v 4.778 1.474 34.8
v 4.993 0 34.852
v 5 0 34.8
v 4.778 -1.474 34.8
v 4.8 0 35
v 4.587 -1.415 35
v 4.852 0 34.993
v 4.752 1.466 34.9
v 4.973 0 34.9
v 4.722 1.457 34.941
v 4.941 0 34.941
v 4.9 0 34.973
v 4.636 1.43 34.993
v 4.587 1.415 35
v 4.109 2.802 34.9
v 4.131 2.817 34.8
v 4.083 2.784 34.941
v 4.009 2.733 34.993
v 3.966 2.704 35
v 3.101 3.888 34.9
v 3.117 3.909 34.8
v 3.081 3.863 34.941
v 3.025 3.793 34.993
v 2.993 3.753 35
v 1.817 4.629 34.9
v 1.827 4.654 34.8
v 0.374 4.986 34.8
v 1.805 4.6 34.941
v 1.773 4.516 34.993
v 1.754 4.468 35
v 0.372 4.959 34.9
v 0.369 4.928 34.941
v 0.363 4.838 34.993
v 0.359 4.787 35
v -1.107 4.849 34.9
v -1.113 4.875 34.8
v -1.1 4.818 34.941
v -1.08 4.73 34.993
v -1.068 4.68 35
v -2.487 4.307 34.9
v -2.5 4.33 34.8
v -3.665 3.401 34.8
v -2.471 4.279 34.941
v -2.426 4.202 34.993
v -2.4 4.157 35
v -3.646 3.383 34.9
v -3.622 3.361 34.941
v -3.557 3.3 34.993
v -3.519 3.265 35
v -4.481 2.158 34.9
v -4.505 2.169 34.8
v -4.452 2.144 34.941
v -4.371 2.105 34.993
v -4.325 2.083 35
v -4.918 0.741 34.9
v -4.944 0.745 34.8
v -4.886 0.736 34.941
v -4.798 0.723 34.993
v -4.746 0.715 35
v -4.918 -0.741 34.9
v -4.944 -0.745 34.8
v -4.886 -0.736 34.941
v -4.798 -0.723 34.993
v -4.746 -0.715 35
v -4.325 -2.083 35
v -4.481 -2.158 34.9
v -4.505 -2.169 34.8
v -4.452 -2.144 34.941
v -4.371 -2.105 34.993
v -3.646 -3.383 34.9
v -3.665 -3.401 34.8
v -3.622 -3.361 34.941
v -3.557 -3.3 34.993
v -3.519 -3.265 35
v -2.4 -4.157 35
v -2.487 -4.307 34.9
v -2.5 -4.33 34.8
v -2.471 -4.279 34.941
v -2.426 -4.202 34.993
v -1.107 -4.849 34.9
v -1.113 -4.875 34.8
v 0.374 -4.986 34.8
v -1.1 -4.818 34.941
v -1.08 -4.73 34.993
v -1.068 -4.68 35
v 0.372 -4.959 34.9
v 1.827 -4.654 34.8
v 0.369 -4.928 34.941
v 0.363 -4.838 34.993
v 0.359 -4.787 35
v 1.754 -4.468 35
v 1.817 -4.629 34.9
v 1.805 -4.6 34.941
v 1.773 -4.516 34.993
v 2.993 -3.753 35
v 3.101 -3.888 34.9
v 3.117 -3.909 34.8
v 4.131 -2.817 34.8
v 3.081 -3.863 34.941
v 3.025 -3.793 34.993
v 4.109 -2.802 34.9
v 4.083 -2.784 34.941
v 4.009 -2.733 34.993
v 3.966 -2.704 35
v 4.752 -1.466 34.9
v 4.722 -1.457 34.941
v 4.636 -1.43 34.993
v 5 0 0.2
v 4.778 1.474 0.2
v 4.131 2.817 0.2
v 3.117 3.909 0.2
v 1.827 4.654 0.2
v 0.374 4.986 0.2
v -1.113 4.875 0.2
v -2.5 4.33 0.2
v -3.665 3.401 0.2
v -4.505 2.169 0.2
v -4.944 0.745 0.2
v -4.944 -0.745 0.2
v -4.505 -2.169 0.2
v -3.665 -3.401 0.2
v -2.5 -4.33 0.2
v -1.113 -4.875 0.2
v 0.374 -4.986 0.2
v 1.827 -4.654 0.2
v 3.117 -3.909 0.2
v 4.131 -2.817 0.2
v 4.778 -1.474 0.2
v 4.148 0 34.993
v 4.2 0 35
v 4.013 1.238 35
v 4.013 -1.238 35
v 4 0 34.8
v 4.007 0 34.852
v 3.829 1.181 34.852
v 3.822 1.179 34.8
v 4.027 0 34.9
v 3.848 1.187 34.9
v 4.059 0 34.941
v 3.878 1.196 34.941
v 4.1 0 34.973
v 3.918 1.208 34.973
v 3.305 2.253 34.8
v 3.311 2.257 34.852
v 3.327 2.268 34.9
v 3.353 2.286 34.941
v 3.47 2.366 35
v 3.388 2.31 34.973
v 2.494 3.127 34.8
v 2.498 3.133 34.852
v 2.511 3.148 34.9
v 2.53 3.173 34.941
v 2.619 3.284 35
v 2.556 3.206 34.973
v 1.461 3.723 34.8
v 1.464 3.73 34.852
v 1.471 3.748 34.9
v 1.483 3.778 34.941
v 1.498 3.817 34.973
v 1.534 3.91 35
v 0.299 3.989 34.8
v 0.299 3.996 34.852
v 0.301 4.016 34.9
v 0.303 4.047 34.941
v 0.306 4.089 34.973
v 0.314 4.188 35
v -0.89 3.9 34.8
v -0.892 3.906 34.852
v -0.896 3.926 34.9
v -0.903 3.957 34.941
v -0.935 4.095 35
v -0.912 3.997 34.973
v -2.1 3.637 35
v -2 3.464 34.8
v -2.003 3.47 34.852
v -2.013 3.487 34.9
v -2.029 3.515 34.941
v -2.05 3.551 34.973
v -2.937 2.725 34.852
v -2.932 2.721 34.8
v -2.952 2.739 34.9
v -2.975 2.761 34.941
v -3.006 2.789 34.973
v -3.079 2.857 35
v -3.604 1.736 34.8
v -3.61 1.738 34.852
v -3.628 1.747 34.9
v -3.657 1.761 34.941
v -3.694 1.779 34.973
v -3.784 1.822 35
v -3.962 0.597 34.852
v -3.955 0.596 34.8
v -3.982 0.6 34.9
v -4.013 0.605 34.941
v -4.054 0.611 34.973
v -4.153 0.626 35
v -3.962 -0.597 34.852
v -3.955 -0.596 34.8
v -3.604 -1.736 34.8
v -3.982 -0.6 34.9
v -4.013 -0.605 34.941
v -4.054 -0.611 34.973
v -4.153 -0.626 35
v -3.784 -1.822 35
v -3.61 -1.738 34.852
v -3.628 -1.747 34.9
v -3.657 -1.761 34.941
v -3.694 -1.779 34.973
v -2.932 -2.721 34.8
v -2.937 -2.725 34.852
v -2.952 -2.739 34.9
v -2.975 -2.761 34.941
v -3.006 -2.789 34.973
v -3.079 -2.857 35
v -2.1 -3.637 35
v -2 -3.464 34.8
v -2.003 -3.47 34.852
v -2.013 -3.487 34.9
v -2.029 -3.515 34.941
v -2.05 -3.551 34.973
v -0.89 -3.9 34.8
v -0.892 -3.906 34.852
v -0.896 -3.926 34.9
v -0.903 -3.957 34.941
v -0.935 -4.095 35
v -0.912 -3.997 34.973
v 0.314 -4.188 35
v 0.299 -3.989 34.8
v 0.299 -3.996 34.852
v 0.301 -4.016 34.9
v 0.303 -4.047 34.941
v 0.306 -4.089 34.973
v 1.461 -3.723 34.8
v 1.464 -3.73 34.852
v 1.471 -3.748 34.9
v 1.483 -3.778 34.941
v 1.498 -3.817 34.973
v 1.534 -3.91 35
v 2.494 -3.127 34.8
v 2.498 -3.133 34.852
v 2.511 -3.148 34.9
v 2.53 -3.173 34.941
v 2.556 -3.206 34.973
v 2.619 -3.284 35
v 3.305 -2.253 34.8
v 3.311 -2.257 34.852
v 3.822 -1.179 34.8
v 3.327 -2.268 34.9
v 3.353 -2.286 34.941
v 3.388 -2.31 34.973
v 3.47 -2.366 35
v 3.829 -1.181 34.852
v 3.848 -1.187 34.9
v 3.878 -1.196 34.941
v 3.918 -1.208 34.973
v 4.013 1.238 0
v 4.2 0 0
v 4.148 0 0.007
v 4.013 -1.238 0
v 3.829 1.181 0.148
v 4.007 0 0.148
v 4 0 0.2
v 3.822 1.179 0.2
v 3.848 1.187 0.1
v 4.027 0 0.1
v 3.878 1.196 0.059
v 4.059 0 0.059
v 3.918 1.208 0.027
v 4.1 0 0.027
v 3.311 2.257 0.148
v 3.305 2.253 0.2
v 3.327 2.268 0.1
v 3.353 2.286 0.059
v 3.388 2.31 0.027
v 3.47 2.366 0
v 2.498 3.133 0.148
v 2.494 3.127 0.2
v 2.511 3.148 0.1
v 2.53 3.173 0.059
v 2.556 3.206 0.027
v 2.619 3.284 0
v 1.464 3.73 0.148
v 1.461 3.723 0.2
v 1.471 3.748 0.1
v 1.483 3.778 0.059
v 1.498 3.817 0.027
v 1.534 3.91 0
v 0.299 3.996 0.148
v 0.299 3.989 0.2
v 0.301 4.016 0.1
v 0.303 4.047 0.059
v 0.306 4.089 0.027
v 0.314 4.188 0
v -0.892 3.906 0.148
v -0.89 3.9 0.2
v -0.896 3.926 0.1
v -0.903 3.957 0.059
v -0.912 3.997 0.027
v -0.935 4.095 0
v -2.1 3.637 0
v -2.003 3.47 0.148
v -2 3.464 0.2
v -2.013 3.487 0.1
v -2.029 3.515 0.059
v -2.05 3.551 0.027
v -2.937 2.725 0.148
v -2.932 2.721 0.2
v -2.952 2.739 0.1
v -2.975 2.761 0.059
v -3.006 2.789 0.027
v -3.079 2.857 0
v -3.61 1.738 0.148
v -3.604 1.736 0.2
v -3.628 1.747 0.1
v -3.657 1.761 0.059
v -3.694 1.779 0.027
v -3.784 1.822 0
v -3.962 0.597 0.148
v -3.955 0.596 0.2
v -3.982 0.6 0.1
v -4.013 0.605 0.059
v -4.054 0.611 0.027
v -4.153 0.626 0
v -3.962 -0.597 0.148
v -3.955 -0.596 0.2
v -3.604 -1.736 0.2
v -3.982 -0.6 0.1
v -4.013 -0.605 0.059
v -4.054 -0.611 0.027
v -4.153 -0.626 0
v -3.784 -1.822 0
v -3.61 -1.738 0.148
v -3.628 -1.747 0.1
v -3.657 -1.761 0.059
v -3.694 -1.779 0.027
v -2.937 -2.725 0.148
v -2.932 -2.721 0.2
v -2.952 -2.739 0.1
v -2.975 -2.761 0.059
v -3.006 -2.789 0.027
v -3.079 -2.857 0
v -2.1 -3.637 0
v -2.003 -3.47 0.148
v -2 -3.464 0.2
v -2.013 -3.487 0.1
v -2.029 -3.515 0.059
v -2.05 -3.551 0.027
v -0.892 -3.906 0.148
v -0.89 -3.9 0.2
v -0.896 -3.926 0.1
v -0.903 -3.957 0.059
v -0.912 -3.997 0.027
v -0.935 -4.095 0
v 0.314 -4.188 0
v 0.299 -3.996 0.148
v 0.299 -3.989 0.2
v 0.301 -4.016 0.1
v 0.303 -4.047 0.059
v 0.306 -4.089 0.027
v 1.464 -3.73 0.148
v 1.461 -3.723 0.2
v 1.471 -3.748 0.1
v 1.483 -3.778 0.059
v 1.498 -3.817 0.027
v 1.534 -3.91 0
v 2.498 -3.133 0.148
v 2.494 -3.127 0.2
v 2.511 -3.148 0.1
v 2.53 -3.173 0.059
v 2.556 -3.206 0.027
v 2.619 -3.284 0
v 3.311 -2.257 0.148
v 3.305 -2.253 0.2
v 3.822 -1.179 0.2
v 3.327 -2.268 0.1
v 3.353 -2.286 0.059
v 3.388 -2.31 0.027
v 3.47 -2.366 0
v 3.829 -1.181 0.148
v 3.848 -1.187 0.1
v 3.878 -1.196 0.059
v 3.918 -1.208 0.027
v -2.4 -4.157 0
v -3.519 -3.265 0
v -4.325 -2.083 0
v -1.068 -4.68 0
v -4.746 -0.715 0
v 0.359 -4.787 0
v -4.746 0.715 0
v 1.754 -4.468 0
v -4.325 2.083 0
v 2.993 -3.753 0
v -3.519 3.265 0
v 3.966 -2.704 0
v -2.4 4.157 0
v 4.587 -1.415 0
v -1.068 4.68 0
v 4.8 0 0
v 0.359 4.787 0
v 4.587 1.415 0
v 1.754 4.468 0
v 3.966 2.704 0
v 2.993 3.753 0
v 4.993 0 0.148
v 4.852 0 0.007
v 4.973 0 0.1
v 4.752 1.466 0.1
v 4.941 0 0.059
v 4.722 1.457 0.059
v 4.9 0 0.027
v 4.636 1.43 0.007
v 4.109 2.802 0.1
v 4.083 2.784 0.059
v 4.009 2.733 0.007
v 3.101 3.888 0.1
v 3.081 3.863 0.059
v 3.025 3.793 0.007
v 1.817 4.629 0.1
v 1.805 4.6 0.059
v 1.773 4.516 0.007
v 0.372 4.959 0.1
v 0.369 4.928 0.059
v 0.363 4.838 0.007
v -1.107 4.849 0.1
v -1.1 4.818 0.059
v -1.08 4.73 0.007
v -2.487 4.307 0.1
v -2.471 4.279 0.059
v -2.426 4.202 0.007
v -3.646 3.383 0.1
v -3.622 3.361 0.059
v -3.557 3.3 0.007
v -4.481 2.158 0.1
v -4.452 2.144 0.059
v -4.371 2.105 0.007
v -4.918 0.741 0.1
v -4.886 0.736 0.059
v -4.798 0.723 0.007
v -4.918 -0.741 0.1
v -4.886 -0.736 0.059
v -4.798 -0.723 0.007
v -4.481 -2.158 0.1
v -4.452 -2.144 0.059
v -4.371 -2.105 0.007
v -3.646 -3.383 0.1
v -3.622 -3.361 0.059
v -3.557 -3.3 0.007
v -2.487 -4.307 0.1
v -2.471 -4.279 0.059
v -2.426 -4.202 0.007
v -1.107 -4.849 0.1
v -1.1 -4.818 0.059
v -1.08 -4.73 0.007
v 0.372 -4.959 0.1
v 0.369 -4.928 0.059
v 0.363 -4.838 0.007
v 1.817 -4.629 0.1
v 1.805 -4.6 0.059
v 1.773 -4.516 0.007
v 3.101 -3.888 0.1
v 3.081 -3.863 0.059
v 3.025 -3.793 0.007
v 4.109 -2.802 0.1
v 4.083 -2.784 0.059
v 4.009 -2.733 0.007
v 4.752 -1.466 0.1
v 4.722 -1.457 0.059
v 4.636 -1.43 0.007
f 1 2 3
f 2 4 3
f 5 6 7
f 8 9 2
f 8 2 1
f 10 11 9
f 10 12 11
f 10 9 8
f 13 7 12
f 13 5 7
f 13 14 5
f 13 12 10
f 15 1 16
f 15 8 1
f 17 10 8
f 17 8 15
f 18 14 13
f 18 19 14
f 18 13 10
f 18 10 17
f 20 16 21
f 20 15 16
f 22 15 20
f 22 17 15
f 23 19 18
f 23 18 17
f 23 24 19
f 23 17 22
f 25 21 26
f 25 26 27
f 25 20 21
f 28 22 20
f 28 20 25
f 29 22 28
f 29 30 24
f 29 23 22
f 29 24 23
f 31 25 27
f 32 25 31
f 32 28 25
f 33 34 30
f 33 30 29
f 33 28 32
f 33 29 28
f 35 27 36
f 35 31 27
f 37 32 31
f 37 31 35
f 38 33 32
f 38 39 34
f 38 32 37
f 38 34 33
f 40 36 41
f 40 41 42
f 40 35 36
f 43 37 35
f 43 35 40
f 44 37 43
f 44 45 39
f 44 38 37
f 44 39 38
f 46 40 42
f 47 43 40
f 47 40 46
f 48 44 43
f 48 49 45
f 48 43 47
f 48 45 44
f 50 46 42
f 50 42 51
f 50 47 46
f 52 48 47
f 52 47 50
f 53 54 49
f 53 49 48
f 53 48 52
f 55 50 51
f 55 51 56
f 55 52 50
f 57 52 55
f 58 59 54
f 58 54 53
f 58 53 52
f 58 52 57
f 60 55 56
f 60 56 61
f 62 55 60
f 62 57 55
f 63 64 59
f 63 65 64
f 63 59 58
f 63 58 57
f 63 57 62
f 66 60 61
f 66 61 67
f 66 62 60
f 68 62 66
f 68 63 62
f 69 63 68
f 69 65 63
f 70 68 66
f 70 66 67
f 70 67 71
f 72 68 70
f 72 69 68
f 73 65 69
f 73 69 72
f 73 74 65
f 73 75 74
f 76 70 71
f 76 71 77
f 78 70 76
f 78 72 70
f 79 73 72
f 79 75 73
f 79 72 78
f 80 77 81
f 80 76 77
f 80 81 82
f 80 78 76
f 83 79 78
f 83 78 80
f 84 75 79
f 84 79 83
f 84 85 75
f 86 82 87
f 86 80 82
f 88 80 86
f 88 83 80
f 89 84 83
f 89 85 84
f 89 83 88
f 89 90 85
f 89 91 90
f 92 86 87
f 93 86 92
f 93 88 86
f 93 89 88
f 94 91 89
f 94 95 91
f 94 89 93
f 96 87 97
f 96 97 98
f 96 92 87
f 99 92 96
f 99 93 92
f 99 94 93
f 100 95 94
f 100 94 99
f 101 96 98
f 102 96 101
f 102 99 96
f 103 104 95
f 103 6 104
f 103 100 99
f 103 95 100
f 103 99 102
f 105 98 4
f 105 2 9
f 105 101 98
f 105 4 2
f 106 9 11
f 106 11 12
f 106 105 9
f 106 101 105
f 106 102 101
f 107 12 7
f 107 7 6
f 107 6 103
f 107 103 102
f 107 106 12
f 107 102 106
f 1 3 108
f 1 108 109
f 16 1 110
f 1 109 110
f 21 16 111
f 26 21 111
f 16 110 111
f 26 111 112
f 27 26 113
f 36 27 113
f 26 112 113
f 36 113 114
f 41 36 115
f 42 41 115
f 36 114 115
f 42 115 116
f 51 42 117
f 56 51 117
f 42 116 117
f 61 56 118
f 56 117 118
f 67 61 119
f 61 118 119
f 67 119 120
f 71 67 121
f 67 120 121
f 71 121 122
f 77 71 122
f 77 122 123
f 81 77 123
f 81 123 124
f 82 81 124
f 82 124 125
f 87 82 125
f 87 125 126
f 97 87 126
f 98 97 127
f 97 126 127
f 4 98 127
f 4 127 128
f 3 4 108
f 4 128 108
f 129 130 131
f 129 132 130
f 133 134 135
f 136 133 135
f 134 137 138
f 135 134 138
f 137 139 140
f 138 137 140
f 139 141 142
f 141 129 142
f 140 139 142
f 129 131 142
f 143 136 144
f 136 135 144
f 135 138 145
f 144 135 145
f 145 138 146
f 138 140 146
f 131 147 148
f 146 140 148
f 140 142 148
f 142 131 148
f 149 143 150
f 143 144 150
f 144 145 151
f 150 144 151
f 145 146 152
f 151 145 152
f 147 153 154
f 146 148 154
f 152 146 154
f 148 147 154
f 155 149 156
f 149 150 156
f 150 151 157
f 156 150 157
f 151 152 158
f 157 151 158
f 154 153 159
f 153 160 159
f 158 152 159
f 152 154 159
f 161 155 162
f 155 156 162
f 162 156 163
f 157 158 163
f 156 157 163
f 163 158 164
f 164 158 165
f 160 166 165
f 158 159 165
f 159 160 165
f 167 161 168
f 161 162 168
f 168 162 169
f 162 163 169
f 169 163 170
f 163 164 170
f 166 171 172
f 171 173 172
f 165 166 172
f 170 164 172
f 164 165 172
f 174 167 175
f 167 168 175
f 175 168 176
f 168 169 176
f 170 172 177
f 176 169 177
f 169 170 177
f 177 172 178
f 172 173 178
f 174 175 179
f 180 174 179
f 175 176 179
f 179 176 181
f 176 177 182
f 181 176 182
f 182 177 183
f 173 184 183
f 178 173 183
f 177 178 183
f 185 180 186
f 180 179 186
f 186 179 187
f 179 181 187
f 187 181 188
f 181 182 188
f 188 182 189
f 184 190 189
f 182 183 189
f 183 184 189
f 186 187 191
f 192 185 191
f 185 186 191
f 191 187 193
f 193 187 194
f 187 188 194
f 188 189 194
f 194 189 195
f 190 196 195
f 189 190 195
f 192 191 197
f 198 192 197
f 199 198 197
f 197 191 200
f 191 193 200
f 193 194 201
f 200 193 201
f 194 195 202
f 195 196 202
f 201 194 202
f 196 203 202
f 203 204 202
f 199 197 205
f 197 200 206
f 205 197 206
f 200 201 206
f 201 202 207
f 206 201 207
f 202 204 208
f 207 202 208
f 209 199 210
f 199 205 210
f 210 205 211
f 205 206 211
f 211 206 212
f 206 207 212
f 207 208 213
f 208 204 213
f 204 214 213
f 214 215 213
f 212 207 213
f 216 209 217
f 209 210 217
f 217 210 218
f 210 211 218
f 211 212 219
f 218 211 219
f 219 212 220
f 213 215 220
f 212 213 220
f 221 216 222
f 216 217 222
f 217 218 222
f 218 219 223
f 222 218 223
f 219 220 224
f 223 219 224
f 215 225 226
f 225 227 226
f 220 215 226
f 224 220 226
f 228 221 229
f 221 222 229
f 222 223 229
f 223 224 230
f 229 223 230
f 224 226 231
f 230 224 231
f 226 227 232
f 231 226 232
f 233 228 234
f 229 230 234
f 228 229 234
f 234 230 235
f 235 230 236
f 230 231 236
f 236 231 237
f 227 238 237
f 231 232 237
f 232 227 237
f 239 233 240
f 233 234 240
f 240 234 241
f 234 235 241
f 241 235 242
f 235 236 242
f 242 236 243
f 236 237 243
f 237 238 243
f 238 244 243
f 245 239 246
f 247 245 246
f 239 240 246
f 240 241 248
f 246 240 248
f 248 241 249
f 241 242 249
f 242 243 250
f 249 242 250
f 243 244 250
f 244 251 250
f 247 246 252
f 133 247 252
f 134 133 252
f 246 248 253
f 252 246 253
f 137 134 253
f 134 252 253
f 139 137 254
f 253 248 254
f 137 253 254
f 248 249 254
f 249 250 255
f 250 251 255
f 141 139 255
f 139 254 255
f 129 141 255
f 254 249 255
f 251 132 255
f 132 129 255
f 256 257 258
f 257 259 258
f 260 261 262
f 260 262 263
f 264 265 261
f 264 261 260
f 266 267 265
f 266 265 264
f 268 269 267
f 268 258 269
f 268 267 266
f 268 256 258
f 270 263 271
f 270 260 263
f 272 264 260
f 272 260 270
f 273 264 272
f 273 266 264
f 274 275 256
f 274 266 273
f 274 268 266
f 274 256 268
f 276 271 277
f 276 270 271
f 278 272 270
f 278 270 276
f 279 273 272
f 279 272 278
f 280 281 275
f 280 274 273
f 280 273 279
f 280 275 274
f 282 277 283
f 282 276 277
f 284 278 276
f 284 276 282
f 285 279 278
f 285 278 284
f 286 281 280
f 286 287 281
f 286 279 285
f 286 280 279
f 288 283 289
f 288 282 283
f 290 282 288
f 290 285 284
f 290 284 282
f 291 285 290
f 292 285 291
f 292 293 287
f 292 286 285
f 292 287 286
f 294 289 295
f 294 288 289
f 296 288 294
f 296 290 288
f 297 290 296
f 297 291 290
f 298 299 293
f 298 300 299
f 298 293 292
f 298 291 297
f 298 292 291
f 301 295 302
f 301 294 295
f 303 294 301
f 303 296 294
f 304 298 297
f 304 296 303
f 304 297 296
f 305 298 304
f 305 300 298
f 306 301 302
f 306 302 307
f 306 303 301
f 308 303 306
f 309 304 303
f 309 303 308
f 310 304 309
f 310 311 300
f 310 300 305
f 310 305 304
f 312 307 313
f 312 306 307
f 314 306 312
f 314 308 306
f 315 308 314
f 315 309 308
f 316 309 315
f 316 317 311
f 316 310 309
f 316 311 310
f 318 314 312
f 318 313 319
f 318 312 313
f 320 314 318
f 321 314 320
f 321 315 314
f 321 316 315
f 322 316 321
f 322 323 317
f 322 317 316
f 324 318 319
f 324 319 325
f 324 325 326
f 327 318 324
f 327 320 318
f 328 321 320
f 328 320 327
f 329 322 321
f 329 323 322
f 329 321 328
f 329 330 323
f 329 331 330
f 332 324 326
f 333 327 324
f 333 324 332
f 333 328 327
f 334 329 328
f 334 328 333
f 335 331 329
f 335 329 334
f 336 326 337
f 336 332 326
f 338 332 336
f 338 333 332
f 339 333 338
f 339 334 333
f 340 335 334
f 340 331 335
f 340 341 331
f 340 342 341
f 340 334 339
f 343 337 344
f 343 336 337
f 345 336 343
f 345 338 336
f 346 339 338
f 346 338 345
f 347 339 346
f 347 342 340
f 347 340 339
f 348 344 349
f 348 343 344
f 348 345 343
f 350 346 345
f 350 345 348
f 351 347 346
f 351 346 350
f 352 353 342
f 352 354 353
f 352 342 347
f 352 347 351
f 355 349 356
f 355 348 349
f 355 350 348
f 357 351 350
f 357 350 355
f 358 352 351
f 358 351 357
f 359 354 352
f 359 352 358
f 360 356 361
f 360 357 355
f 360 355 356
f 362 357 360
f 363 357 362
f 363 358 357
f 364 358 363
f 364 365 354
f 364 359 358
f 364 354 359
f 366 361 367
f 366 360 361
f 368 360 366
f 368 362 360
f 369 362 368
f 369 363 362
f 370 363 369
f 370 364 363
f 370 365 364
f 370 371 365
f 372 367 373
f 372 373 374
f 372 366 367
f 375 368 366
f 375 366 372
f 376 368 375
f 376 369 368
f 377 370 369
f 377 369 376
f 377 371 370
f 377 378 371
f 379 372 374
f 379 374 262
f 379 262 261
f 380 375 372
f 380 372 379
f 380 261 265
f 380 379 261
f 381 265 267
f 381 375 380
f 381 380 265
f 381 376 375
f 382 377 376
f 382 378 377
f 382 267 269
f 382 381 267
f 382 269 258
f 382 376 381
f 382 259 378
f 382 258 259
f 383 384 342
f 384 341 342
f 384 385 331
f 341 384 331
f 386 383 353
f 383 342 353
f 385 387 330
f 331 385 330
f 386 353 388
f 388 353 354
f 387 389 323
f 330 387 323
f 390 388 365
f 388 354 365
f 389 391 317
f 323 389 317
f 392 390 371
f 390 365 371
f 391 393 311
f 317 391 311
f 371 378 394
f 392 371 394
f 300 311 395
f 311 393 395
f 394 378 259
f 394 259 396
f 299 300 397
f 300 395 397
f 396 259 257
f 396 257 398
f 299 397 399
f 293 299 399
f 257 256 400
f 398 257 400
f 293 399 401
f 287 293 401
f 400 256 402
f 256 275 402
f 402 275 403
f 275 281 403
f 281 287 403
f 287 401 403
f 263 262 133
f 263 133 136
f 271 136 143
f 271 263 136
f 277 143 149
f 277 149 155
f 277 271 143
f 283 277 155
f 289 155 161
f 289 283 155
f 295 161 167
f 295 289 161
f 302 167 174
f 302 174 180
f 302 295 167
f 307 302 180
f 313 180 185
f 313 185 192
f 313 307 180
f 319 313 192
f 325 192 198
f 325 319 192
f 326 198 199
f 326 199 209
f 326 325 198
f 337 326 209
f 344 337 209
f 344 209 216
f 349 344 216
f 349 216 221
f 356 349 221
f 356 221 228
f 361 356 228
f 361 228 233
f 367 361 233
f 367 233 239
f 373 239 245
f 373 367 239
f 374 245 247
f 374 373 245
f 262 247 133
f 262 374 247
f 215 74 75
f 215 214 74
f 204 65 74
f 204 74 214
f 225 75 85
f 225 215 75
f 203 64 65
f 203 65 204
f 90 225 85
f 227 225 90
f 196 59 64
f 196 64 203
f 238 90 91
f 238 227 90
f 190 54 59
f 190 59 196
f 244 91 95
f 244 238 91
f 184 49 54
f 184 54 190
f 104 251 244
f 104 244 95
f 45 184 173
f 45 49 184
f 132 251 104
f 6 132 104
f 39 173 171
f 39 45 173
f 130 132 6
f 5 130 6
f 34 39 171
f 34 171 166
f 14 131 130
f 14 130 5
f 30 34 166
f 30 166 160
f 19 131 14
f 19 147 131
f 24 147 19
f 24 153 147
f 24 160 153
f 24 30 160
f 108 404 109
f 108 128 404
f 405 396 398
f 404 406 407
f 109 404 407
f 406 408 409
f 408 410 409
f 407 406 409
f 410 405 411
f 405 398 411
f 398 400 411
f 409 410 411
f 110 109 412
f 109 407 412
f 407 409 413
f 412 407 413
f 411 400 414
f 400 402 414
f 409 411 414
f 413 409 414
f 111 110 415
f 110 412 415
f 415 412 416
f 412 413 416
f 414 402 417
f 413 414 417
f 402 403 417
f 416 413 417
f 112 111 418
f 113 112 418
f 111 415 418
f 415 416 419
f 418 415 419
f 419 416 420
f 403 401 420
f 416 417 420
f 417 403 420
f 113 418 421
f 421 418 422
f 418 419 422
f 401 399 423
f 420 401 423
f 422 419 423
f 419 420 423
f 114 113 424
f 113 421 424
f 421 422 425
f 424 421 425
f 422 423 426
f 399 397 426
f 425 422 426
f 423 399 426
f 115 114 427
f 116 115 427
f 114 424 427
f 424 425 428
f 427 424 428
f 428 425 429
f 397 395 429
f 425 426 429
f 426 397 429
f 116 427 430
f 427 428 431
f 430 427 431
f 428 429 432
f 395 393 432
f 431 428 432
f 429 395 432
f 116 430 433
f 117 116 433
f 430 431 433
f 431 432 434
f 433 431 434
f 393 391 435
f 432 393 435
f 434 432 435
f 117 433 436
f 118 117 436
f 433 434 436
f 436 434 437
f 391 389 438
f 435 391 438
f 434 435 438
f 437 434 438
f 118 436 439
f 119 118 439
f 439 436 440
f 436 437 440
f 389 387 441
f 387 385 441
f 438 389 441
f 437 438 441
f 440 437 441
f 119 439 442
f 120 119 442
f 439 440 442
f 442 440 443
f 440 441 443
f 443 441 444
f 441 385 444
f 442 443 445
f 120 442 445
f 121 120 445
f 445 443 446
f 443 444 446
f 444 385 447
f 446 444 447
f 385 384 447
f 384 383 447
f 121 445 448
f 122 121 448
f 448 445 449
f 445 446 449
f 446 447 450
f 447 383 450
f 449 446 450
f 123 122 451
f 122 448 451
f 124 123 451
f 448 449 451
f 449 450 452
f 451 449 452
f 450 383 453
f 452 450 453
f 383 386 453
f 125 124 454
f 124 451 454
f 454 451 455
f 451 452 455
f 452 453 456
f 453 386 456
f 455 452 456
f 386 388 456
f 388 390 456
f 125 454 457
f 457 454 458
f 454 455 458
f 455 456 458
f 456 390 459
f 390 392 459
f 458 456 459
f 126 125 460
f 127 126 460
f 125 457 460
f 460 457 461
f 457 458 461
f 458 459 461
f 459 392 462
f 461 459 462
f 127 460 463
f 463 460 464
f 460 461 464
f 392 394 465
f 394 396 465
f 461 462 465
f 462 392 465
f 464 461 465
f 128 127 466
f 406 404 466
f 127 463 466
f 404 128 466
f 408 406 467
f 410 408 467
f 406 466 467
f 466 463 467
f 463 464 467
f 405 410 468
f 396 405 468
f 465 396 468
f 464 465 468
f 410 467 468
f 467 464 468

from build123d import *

# Parameters (mm, degrees)
SKIZZE1_R                       = 5
SKIZZE1_R_2                     = 4
AUFSATZ_LINEAR_AUSTRAGEN1_DEPTH = 35
VERRUNDUNG1_R                   = 0.2


with BuildPart() as part:
    # Skizze1 → Aufsatz-Linear austragen1 (new body)
    with BuildSketch(Plane.XY):
        Circle(SKIZZE1_R)
        Circle(SKIZZE1_R_2, mode=Mode.SUBTRACT)
    extrude(amount=AUFSATZ_LINEAR_AUSTRAGEN1_DEPTH)

    # Verrundung1
    verrundung1_edges = [part.edges().sort_by_distance(p)[0] for p in [
        (-5, 0, 0),
        (-5, 0, 35),
        (-4, 0, 0),
        (-4, 0, 35),
    ]]
    fillet(verrundung1_edges, radius=VERRUNDUNG1_R)


solid = part.part
